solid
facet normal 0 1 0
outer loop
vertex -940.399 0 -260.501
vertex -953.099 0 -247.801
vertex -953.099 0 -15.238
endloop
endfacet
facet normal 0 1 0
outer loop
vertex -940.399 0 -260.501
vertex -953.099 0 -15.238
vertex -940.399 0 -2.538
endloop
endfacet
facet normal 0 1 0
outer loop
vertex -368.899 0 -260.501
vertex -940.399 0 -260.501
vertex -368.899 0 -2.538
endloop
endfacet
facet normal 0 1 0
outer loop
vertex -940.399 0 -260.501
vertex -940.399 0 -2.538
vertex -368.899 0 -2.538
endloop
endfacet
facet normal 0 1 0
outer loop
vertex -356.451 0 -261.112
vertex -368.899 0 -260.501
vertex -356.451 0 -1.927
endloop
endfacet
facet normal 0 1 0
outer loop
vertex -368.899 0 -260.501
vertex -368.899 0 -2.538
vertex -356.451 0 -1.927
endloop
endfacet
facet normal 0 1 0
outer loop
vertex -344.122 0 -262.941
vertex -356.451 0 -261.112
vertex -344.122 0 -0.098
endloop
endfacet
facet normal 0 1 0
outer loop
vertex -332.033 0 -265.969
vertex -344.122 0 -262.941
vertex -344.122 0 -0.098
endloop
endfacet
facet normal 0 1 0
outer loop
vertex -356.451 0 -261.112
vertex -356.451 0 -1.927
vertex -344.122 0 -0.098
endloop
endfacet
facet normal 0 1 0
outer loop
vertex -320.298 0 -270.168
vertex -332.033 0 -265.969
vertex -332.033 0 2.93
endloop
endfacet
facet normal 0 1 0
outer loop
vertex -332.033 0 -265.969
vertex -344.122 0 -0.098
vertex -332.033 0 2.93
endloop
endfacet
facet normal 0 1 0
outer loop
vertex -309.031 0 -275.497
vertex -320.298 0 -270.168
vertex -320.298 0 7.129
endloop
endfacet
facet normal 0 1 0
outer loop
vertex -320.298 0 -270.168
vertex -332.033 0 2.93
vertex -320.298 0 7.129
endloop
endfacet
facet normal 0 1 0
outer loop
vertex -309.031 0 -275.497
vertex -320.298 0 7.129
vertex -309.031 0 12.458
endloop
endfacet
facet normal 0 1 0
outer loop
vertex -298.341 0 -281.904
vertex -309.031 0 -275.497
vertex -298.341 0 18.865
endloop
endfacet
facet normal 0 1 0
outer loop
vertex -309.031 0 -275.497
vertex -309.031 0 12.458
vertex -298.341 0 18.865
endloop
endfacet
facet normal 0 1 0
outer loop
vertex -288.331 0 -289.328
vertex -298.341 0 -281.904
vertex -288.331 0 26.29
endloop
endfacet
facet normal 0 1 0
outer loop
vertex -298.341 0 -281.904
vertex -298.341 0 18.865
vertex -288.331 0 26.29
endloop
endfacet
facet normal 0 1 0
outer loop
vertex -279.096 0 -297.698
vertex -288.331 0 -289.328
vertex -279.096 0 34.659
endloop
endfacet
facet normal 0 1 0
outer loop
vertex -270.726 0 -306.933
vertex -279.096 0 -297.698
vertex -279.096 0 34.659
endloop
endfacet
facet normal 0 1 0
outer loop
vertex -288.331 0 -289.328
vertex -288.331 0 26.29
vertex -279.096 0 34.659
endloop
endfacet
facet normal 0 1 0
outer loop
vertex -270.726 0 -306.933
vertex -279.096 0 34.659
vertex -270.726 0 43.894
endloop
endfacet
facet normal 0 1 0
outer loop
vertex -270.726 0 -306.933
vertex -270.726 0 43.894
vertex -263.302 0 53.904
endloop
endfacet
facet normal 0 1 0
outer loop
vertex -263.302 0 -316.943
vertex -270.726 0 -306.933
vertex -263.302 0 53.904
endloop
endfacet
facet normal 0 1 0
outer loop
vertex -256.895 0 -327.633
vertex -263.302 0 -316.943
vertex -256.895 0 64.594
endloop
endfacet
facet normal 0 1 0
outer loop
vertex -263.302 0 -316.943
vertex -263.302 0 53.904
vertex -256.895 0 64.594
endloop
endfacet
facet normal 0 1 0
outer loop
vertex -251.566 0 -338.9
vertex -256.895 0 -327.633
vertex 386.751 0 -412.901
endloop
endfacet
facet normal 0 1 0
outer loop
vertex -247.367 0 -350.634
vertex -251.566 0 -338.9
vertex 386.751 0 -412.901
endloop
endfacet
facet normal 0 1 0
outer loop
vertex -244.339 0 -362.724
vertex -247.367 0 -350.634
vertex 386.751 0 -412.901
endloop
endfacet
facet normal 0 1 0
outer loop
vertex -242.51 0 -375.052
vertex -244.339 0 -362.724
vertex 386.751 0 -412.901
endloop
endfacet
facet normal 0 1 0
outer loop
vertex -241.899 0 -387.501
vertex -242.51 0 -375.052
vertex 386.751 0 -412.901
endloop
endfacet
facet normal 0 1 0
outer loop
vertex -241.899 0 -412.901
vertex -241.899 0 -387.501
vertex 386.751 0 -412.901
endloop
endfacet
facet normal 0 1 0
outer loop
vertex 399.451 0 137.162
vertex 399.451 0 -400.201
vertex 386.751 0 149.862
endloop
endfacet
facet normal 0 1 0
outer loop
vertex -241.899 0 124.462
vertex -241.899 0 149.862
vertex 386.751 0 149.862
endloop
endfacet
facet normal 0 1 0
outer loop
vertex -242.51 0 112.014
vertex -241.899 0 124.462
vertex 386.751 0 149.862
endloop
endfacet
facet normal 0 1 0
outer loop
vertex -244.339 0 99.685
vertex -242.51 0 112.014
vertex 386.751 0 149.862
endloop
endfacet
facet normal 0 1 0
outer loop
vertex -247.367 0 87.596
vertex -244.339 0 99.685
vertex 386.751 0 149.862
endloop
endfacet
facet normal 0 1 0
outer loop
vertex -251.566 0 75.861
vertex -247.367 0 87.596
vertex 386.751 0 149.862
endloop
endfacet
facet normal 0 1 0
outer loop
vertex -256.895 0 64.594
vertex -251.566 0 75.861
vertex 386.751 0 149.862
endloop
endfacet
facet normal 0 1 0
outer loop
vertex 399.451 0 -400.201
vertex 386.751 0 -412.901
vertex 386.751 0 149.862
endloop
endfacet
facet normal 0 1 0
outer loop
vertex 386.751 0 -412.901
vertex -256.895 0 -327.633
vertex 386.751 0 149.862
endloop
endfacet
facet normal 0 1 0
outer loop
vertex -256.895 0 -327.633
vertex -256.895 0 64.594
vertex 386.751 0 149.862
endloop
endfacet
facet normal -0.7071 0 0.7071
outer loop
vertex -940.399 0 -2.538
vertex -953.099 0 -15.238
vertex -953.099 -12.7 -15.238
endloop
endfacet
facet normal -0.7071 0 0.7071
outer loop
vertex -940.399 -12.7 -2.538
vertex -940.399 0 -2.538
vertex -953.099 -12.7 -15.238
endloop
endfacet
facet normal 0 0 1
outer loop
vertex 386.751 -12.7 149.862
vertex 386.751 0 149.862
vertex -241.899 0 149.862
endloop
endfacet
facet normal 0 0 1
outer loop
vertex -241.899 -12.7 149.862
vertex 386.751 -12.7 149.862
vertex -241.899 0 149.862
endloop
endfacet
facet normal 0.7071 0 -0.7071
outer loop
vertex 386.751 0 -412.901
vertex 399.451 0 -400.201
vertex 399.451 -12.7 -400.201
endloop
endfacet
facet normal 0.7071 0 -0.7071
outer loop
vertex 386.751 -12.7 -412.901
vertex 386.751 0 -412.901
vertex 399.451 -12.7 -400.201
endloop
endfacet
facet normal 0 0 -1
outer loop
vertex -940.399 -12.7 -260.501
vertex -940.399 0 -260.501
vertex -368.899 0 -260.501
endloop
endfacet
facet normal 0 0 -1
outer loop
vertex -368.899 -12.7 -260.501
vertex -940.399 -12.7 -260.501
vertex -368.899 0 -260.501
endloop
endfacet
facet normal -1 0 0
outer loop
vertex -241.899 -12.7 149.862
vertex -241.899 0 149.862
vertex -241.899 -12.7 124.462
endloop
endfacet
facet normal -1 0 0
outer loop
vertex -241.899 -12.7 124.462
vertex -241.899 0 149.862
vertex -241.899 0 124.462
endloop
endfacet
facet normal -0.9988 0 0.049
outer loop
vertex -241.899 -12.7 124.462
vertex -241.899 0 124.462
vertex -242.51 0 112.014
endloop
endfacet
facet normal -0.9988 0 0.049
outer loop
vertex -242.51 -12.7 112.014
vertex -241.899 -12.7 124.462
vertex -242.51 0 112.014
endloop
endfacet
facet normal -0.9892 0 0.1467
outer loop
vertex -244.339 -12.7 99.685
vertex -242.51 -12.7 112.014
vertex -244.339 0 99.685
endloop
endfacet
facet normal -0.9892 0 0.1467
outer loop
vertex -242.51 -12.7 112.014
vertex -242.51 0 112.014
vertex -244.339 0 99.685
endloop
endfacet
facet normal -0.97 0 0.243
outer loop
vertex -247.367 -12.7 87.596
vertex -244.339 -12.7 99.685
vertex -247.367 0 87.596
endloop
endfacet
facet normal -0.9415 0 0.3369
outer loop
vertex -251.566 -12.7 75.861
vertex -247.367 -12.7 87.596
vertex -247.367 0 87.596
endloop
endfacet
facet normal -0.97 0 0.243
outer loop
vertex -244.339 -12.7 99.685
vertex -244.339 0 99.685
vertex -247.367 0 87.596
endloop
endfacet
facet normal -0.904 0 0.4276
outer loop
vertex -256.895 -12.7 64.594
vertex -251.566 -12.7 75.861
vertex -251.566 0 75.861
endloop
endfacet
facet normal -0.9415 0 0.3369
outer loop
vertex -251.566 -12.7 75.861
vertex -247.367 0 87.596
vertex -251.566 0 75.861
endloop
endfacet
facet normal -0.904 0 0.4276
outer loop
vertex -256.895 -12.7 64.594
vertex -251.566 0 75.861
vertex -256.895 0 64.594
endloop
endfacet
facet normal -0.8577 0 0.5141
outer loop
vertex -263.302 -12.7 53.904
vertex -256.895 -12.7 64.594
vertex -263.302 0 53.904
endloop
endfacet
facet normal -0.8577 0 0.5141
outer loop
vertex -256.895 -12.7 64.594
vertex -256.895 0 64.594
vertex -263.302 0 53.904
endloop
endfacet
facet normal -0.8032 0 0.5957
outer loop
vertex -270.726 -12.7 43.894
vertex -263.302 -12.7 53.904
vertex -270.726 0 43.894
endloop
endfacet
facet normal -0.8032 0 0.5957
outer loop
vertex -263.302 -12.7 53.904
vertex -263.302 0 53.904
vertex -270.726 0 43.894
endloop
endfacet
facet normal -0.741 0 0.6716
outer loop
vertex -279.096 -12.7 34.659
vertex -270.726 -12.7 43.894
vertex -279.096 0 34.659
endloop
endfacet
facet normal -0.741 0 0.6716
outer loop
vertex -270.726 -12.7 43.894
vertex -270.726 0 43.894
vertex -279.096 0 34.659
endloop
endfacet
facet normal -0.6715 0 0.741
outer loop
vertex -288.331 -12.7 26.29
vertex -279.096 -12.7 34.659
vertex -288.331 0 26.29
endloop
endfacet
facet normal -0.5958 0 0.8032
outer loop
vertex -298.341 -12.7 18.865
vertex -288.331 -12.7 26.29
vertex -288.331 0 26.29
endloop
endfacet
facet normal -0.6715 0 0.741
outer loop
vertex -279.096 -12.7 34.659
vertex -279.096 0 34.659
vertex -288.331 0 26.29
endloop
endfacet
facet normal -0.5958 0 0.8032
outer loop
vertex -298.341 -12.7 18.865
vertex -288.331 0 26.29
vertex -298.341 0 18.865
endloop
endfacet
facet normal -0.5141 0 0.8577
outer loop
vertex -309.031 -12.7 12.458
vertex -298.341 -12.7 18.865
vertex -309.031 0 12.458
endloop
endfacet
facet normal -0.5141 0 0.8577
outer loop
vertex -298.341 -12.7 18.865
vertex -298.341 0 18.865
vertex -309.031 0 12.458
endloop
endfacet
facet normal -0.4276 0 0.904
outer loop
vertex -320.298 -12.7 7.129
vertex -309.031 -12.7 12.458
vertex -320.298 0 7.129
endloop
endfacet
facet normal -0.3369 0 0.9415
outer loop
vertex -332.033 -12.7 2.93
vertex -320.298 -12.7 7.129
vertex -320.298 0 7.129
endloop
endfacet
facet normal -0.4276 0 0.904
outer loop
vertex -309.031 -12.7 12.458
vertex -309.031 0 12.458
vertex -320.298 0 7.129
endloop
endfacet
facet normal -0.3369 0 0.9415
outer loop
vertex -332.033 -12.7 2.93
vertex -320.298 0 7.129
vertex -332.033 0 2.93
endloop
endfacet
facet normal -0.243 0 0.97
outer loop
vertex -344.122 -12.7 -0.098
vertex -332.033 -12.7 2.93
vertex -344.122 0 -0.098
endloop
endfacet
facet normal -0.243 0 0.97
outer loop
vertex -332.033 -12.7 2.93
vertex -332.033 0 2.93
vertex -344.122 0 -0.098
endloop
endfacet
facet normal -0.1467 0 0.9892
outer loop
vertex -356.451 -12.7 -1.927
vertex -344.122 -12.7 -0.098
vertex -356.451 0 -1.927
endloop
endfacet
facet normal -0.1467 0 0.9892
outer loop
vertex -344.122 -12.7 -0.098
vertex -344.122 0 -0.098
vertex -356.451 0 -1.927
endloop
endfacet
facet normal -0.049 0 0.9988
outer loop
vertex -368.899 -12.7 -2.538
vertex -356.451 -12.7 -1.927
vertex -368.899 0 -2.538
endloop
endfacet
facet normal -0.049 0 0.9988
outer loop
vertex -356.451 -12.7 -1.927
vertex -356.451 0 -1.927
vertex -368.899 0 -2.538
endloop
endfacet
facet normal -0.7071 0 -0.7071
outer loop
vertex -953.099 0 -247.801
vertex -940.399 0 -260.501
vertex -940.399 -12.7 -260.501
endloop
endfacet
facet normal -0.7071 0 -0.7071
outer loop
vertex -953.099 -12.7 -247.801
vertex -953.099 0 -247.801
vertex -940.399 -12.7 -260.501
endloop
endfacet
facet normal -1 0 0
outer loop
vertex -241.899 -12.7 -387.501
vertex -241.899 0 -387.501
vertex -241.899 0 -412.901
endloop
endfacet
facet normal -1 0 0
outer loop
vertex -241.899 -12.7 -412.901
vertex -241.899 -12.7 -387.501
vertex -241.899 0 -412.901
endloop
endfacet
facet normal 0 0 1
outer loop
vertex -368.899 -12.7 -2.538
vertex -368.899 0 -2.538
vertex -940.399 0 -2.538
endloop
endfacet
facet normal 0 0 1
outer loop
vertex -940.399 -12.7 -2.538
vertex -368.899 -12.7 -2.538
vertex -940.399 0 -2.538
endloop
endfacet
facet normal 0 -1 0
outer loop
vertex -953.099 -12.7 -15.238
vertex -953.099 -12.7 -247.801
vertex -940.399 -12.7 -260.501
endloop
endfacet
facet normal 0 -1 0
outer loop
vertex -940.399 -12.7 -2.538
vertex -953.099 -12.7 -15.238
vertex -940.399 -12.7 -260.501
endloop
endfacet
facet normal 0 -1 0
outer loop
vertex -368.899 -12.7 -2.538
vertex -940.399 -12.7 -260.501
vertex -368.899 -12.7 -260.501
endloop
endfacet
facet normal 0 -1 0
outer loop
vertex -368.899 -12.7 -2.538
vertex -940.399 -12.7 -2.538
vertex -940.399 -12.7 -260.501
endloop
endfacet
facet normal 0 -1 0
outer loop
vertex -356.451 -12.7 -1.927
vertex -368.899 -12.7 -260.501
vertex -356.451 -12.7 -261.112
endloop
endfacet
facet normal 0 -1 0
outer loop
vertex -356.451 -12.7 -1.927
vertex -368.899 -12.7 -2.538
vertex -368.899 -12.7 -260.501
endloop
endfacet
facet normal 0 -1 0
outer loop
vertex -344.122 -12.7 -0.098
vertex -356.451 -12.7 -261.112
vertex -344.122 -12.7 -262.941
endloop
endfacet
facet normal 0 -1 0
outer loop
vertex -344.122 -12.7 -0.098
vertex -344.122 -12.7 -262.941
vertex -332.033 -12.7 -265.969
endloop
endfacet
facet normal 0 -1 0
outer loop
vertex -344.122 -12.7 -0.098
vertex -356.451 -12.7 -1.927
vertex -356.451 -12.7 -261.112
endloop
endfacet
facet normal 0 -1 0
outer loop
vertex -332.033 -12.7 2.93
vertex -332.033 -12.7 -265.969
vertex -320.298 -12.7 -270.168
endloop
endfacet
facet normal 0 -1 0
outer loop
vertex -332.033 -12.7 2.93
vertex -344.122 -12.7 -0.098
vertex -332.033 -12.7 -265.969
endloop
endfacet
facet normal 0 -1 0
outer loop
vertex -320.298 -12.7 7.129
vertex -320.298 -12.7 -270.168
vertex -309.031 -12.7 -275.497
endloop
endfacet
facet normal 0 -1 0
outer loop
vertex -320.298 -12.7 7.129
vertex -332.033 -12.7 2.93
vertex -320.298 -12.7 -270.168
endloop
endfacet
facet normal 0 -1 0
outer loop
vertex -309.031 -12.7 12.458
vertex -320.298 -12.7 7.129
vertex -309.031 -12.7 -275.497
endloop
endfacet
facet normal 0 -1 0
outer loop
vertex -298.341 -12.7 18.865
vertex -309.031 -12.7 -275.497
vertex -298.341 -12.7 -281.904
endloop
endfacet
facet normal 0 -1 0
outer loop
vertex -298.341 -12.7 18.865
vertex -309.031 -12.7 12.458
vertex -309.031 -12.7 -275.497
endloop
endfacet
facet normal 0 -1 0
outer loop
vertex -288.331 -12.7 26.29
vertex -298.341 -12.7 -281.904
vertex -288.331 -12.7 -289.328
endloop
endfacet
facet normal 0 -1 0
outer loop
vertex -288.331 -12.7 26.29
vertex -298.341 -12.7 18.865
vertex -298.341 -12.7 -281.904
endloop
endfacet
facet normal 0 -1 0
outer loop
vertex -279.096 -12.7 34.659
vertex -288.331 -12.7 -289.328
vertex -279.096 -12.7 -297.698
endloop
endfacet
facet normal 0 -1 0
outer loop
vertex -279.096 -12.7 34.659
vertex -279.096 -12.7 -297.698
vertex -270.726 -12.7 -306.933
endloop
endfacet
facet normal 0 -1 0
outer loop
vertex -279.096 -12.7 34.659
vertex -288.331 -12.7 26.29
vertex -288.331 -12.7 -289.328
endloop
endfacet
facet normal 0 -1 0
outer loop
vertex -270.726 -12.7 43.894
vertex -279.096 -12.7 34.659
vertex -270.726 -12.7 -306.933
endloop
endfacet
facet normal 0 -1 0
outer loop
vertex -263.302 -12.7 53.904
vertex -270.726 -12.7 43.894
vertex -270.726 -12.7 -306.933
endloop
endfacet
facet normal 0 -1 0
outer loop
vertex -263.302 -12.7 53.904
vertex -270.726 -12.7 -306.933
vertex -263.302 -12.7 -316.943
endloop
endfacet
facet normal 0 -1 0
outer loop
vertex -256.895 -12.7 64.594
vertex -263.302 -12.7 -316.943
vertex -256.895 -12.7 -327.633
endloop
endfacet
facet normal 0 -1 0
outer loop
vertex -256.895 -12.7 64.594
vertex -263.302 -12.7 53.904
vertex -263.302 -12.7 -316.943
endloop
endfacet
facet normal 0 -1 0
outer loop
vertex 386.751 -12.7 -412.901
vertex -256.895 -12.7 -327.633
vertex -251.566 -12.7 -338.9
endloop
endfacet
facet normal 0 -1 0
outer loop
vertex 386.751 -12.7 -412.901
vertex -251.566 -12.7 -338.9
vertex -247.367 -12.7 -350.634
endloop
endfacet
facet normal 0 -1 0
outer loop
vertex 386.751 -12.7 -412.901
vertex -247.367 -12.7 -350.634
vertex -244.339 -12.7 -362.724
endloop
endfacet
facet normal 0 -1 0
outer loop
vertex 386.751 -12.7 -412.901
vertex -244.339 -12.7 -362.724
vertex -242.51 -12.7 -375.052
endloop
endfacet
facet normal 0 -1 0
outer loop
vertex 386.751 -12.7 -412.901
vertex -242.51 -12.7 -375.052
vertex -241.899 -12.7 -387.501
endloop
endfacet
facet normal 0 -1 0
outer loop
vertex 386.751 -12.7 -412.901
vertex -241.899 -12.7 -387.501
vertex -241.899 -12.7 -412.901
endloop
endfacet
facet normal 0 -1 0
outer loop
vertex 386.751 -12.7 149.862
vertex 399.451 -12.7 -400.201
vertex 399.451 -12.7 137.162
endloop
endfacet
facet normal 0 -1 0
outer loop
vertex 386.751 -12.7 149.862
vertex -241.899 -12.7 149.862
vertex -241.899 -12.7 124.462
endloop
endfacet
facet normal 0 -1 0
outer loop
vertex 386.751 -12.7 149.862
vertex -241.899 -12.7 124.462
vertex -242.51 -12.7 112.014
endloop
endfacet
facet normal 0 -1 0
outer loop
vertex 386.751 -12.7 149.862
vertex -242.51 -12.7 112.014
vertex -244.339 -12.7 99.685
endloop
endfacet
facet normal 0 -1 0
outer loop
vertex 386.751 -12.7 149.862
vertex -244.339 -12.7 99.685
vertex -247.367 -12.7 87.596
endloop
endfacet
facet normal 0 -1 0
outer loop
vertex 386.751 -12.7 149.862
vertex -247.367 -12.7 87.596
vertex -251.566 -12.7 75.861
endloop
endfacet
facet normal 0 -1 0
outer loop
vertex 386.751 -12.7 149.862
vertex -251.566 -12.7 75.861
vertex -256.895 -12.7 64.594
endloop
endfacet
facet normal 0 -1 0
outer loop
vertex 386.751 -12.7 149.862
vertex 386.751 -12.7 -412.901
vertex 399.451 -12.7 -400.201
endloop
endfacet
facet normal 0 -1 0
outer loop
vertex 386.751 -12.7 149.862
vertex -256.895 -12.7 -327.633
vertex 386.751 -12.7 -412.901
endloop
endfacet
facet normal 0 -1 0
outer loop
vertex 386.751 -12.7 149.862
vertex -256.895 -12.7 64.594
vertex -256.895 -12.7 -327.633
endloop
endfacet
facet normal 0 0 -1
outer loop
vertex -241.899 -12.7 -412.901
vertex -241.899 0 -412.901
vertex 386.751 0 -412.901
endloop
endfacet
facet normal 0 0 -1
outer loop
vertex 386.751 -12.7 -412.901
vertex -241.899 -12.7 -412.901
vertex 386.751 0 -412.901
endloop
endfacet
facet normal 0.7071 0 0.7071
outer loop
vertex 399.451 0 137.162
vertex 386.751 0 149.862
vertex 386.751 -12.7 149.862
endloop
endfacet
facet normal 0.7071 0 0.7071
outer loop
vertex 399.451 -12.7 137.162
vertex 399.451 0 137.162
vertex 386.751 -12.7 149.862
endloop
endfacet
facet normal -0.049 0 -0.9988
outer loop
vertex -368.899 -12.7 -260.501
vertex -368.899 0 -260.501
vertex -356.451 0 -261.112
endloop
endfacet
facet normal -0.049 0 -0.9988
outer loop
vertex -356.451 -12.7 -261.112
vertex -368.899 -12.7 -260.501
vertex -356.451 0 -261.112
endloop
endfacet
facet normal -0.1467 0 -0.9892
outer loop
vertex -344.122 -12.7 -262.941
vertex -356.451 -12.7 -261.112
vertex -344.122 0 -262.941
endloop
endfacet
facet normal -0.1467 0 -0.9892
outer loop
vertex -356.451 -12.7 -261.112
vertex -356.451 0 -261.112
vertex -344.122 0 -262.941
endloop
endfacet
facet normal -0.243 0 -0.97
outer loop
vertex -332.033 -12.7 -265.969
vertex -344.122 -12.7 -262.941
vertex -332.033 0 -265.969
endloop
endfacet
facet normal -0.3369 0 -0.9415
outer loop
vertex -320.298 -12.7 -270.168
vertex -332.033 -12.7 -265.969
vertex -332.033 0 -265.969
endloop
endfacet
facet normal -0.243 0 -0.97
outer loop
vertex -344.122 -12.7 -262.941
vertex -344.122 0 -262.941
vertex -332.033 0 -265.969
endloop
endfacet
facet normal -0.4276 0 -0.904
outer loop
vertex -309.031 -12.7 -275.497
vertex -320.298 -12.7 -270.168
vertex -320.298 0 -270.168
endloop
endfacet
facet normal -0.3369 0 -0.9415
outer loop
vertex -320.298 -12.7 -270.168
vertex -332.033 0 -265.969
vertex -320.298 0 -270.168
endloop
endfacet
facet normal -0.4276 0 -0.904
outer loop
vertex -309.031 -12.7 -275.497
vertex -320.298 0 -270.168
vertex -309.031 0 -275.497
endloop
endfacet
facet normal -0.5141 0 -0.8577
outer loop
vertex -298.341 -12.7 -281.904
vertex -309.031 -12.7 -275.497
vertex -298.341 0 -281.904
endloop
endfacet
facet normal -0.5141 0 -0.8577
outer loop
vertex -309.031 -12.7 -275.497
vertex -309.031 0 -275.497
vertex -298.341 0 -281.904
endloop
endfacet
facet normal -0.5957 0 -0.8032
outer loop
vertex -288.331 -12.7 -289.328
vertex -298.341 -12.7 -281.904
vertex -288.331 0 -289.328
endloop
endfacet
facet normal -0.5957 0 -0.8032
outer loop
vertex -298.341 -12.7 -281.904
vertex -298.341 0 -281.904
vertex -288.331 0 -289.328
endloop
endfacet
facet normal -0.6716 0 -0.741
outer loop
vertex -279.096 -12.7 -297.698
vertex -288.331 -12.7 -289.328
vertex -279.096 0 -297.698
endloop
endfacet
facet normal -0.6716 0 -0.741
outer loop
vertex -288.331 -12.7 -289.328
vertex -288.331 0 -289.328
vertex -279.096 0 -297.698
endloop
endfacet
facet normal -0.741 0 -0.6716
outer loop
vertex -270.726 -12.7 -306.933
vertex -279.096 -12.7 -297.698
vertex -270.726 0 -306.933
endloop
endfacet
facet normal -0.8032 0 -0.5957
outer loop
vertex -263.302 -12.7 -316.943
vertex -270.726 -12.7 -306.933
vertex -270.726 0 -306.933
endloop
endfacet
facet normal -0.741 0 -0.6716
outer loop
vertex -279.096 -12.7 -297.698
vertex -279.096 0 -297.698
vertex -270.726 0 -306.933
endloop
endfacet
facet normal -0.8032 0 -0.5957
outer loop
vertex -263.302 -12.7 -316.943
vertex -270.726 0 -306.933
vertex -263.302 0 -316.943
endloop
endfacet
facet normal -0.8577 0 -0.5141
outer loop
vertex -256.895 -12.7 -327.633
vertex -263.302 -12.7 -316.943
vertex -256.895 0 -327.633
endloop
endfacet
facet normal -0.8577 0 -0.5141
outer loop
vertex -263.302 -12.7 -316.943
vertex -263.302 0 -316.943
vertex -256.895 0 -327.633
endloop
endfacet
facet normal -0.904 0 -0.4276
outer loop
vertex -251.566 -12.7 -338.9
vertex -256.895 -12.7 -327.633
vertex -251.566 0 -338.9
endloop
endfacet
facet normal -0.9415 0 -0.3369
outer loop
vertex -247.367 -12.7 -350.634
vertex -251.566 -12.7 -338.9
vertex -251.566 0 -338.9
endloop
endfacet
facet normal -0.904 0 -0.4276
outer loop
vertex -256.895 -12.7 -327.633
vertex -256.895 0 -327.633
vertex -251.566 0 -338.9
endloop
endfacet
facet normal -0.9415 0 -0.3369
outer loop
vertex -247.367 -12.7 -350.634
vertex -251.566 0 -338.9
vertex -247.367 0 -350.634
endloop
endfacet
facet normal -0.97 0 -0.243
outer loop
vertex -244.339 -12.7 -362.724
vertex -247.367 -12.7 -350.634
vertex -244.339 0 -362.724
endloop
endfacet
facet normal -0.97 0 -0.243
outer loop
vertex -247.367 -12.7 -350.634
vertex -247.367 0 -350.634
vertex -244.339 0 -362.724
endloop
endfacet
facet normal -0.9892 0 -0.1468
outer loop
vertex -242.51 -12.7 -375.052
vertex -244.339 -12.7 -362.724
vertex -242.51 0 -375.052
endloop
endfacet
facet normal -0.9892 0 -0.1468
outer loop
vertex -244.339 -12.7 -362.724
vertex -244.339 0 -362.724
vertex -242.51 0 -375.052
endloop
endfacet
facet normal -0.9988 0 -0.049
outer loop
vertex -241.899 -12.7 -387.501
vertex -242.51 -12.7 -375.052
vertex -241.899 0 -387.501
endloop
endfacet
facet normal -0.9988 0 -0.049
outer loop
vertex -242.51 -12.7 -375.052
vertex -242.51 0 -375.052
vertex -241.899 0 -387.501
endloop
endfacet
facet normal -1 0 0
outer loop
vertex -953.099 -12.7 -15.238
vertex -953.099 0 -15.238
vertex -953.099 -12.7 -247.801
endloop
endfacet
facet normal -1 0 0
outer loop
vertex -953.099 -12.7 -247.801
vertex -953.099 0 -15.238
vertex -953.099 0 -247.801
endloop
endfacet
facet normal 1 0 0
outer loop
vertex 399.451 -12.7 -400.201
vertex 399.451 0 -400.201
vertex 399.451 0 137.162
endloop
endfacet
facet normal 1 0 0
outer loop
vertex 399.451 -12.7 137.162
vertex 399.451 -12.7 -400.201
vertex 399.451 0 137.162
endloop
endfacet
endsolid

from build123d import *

# Parameters (mm, degrees)
F1_DEPTH = 12.7
F2_SIZE  = 12.7


with BuildPart() as f1:
    # F0 (on Front) → F1 (new body)
    with BuildSketch(Plane.XZ):
        with BuildLine():
            Line((399.451222, -412.90055), (399.451222, 149.86185))
            Line((399.451222, 149.86185), (-241.898778, 149.86185))
            Line((-241.898778, 149.86185), (-241.898778, 124.46185))
            ThreePointArc((-241.898778, 124.46185), (-279.096217, 34.659289), (-368.898778, -2.53815))
            Line((-368.898778, -2.53815), (-953.098778, -2.53815))
            Line((-953.098778, -2.53815), (-953.098778, -260.50055))
            Line((-953.098778, -260.50055), (-368.898778, -260.50055))
            ThreePointArc((-368.898778, -260.50055), (-279.096217, -297.697989), (-241.898778, -387.50055))
            Line((-241.898778, -387.50055), (-241.898778, -412.90055))
            Line((-241.898778, -412.90055), (399.451222, -412.90055))
        make_face()
    extrude(amount=F1_DEPTH)

    # F2
    f2_edges = [f1.edges().sort_by_distance(p)[0] for p in [
        (-953.098778, -6.35, -2.53815),
        (-953.098778, -6.35, -260.50055),
        (399.451222, -6.35, -412.90055),
        (399.451222, -6.35, 149.86185),
    ]]
    chamfer(f2_edges, length=F2_SIZE)


solid = f1.part
